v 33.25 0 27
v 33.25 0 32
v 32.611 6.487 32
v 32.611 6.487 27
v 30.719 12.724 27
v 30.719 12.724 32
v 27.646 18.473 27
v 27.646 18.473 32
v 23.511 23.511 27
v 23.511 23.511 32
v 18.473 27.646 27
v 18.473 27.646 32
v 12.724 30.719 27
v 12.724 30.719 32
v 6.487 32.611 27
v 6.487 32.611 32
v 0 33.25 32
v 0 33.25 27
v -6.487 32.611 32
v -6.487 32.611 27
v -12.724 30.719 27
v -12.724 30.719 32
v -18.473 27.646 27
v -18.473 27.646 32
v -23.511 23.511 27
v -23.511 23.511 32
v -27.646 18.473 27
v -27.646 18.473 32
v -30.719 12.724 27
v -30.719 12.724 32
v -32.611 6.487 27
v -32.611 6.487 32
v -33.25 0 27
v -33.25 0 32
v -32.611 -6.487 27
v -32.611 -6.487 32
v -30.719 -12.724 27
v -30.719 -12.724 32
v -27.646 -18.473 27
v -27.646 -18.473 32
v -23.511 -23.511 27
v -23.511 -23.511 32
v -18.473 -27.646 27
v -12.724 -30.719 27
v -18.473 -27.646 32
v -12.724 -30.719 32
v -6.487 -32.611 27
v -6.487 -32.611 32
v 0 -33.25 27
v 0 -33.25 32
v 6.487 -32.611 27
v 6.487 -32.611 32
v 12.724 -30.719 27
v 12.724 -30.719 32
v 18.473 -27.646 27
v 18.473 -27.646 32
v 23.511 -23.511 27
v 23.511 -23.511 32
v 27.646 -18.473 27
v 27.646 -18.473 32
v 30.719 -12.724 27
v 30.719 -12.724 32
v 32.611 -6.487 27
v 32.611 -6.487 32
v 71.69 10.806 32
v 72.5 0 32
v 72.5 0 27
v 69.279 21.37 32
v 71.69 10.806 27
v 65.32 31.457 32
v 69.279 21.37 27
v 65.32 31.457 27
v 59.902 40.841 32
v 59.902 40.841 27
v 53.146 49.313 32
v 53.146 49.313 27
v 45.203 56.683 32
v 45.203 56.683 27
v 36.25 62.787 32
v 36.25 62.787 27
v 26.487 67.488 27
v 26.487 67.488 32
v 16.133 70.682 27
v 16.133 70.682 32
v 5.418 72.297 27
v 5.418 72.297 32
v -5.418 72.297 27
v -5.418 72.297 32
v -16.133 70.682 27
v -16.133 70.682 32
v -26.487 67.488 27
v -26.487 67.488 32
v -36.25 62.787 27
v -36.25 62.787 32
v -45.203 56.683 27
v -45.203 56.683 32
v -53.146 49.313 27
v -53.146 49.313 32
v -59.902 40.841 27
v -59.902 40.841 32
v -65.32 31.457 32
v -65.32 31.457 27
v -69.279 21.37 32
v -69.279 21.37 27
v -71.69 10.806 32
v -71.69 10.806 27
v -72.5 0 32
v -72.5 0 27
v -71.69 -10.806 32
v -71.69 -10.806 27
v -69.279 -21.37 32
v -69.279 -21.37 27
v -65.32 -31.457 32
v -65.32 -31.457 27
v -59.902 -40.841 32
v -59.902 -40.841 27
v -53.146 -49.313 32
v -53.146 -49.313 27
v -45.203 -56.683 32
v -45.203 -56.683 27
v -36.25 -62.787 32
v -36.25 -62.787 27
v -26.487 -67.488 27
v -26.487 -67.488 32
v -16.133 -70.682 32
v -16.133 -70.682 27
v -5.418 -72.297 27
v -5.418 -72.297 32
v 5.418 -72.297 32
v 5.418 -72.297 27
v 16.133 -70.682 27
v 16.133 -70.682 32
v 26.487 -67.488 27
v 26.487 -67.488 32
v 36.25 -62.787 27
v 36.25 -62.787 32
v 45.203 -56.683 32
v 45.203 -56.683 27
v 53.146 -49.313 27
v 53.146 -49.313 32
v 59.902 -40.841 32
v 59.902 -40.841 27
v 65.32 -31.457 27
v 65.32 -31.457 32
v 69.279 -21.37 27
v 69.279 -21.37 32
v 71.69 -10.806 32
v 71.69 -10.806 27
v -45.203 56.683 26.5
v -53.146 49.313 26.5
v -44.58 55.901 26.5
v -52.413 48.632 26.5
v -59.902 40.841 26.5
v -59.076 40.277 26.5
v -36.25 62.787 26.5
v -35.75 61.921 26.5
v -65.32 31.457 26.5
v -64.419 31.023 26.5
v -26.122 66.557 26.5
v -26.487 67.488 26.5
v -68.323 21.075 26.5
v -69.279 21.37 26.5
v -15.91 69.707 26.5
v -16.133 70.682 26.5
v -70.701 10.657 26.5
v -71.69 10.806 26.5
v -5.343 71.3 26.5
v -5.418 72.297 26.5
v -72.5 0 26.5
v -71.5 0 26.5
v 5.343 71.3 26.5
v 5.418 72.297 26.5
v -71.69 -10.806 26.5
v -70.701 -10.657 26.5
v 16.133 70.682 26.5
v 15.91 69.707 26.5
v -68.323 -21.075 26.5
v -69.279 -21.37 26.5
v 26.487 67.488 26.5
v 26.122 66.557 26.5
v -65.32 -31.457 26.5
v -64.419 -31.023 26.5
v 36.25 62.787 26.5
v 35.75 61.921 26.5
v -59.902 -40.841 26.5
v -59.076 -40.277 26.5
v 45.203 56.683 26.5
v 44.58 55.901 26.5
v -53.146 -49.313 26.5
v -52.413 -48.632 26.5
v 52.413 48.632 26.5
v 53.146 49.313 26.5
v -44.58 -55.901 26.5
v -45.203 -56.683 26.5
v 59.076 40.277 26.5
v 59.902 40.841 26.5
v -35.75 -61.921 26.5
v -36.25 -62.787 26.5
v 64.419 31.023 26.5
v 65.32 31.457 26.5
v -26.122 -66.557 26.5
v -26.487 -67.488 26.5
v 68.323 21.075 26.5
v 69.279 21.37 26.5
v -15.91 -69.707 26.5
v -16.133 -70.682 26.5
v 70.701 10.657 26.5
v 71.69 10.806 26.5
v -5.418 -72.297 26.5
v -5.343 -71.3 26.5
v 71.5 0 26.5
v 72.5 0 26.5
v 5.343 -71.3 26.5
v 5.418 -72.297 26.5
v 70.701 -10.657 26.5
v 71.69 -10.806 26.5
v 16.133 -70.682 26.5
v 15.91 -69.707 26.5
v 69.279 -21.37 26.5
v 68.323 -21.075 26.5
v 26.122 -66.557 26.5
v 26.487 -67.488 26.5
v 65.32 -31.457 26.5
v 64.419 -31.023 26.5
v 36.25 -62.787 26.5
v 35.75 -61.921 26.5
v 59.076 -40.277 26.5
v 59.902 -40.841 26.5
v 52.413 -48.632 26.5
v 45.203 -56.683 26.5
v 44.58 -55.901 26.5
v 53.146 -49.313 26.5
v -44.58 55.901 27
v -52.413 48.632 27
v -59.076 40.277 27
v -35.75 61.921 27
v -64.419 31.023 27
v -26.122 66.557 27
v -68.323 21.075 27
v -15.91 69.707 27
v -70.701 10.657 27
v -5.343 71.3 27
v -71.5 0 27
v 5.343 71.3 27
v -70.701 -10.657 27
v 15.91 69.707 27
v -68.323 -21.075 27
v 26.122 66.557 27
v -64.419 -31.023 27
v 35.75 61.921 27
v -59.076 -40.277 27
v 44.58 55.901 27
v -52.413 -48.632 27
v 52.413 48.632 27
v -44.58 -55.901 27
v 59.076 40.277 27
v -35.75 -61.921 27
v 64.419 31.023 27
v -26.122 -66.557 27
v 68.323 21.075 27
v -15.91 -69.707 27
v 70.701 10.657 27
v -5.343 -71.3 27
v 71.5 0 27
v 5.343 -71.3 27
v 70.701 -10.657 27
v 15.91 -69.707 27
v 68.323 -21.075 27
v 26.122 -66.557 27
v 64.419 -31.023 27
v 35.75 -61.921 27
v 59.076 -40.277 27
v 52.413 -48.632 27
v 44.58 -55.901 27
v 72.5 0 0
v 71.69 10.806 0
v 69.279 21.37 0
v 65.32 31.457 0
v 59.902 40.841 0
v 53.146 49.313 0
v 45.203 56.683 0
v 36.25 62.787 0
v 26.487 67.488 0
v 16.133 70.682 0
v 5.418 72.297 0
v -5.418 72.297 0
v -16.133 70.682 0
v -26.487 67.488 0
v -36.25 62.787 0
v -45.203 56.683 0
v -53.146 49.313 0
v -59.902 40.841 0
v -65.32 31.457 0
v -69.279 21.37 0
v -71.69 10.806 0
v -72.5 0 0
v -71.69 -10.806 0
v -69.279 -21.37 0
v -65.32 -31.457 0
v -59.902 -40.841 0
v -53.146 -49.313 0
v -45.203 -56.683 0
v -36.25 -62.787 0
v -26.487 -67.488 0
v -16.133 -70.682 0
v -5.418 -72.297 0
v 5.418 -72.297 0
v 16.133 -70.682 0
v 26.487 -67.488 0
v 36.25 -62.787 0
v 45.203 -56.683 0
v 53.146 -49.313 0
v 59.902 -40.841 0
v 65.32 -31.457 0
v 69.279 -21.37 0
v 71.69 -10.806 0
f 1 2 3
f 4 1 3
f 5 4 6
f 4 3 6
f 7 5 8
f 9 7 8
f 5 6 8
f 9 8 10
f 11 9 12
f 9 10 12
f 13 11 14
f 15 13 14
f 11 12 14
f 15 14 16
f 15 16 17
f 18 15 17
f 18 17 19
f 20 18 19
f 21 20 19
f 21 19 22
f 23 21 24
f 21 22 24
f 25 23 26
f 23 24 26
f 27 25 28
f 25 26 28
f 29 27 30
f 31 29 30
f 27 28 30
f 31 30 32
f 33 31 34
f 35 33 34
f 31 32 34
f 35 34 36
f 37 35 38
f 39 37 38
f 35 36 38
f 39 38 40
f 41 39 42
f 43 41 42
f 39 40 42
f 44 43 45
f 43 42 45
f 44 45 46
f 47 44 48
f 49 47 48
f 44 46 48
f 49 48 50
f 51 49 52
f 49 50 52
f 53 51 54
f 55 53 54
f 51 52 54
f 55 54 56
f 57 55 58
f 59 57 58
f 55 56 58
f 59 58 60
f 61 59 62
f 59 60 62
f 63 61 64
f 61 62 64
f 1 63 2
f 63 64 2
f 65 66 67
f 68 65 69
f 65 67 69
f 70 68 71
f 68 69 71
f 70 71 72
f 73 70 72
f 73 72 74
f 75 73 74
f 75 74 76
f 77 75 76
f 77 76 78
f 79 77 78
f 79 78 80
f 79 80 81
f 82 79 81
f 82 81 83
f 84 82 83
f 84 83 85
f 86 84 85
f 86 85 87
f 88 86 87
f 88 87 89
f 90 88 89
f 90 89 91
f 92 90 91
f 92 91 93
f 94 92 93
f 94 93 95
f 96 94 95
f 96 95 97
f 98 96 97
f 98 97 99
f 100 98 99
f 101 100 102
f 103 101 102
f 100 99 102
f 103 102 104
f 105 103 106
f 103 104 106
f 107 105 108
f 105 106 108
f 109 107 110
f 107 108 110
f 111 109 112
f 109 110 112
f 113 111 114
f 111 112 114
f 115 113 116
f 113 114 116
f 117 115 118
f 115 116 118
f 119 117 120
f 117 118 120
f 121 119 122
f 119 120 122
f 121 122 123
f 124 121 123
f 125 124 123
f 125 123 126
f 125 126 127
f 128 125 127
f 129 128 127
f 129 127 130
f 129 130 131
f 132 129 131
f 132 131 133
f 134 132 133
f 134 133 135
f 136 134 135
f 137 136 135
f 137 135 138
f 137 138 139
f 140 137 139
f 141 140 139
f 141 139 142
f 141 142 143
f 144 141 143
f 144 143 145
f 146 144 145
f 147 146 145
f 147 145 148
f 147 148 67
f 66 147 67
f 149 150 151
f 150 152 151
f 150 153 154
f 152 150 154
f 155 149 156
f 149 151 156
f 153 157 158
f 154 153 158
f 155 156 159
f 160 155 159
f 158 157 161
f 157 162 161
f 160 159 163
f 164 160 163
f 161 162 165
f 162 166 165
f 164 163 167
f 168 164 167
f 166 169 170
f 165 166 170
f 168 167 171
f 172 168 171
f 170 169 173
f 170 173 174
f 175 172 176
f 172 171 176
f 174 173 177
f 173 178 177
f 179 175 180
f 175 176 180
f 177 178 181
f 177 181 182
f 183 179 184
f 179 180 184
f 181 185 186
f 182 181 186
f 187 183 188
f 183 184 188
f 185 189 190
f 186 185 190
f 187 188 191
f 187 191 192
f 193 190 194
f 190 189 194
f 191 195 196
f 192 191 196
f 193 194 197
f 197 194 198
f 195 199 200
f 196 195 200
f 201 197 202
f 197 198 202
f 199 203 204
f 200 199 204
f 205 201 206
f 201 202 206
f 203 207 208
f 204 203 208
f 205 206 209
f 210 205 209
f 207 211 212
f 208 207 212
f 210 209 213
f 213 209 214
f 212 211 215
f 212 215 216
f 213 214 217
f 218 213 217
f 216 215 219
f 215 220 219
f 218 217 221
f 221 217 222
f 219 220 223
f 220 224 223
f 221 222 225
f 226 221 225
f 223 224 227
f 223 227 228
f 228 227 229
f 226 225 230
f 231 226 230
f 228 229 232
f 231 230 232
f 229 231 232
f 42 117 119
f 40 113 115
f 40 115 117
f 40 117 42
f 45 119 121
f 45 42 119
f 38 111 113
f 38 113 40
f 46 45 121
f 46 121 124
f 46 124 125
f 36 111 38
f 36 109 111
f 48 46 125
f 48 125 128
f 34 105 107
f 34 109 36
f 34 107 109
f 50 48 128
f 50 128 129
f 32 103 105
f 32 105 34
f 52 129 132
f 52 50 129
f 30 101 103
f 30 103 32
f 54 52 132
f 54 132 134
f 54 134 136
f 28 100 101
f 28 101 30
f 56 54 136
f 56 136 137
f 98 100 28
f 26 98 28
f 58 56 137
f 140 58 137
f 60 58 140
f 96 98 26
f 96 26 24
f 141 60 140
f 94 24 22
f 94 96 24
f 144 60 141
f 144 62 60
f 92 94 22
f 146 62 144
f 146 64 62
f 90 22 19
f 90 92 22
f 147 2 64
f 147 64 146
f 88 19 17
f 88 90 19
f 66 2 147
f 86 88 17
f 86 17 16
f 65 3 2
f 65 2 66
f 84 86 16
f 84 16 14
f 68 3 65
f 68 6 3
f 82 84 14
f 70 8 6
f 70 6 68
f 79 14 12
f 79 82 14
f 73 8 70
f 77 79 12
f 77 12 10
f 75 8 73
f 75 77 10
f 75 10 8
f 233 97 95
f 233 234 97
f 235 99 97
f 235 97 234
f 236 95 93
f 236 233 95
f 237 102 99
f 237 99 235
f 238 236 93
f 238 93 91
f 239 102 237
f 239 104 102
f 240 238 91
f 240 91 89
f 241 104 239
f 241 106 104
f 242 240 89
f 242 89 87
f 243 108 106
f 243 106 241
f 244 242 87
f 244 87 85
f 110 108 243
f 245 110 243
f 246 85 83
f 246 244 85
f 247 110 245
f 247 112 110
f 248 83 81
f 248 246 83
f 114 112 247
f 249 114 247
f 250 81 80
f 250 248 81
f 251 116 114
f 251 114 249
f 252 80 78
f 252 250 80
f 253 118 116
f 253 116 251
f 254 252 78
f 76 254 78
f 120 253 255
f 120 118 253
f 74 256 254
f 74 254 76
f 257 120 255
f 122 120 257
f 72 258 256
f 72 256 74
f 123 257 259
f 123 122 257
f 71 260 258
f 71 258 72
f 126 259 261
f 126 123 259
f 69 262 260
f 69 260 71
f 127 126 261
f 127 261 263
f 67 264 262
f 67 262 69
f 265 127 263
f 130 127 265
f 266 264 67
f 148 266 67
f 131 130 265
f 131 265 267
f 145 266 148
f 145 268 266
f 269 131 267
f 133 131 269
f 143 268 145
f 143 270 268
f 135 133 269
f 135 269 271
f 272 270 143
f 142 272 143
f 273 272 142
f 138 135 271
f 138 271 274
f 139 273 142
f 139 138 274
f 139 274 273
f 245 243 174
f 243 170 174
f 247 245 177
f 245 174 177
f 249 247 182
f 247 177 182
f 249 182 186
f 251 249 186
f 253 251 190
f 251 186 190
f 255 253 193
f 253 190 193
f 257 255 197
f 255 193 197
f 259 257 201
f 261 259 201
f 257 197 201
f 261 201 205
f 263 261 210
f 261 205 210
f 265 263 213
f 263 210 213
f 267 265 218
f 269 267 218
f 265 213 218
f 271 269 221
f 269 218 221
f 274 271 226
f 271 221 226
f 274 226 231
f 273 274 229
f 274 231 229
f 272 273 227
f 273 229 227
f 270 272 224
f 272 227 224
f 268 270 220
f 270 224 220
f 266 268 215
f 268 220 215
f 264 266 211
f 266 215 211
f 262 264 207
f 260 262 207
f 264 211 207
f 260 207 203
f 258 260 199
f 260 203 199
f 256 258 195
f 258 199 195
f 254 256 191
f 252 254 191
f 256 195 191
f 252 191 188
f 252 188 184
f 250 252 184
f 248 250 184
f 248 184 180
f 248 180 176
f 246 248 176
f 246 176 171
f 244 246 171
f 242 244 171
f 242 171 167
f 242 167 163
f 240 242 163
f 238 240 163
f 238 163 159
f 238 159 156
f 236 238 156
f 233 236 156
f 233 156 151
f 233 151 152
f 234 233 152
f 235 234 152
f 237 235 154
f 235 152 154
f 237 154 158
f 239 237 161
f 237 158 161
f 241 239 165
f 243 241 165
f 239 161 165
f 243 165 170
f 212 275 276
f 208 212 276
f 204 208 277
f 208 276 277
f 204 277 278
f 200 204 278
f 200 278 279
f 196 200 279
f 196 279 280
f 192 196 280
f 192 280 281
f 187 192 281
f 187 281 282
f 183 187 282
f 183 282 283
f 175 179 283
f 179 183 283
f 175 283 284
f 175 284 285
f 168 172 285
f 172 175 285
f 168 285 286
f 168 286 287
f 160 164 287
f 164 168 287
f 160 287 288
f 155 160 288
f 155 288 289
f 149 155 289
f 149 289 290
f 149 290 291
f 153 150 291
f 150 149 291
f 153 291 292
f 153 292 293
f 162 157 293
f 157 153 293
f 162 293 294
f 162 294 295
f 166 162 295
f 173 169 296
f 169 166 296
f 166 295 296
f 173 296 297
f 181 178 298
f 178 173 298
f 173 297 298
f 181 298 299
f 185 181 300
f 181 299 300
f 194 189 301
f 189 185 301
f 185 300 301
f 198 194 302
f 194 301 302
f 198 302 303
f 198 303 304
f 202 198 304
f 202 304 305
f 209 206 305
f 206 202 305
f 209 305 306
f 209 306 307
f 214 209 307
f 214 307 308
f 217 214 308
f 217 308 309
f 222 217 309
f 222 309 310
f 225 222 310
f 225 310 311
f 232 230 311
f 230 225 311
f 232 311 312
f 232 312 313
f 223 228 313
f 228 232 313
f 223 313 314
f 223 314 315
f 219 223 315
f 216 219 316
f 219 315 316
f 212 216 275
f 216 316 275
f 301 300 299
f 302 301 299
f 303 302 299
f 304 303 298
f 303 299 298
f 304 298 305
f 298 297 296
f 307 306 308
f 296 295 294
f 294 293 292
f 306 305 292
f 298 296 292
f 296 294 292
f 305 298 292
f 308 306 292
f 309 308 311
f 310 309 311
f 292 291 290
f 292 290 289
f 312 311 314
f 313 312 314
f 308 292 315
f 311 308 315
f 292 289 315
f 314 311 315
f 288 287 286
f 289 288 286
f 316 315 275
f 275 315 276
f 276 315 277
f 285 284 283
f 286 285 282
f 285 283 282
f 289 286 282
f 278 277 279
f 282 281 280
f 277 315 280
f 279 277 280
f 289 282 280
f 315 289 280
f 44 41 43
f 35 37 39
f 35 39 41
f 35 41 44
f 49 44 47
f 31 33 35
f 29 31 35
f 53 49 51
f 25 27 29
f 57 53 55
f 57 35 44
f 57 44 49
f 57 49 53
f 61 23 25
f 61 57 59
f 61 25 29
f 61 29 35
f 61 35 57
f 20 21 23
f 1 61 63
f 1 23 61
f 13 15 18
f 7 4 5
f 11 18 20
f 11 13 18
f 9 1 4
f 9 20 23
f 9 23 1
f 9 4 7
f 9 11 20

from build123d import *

# Parameters (mm, degrees)
SKIZZE2_R         = 72.5
BASE_DEPTH        = 32
SKIZZE3_W         = 1
SKIZZE3_H         = 0.5
SKIZZE4_R         = 33.25
LIDAR_SPACE_DEPTH = 5


with BuildPart() as part:
    # Skizze2 → Base (new body)
    with BuildSketch(Plane.XY):
        Circle(SKIZZE2_R)
    extrude(amount=BASE_DEPTH)

    # Skizze3 → Cover Seam (revolve, cut)
    with BuildSketch(Plane(origin=(0, 0, 0), x_dir=(1, 0, 0), z_dir=(0, 1, 0)), mode=Mode.PRIVATE) as cover_seam_sk:
        with Locations((72, -26.75)):
            Rectangle(SKIZZE3_W, SKIZZE3_H)
    revolve(cover_seam_sk.sketch.rotate(Axis((0, 0, 0), (0, 0, 1)), 180), axis=Axis((0, 0, 0), (0, 0, 1)), mode=Mode.SUBTRACT)

    # Skizze4 → Lidar Space (cut)
    with BuildSketch(Plane.XY.offset(32)):
        Circle(SKIZZE4_R)
    extrude(amount=-LIDAR_SPACE_DEPTH, mode=Mode.SUBTRACT)


solid = part.part
